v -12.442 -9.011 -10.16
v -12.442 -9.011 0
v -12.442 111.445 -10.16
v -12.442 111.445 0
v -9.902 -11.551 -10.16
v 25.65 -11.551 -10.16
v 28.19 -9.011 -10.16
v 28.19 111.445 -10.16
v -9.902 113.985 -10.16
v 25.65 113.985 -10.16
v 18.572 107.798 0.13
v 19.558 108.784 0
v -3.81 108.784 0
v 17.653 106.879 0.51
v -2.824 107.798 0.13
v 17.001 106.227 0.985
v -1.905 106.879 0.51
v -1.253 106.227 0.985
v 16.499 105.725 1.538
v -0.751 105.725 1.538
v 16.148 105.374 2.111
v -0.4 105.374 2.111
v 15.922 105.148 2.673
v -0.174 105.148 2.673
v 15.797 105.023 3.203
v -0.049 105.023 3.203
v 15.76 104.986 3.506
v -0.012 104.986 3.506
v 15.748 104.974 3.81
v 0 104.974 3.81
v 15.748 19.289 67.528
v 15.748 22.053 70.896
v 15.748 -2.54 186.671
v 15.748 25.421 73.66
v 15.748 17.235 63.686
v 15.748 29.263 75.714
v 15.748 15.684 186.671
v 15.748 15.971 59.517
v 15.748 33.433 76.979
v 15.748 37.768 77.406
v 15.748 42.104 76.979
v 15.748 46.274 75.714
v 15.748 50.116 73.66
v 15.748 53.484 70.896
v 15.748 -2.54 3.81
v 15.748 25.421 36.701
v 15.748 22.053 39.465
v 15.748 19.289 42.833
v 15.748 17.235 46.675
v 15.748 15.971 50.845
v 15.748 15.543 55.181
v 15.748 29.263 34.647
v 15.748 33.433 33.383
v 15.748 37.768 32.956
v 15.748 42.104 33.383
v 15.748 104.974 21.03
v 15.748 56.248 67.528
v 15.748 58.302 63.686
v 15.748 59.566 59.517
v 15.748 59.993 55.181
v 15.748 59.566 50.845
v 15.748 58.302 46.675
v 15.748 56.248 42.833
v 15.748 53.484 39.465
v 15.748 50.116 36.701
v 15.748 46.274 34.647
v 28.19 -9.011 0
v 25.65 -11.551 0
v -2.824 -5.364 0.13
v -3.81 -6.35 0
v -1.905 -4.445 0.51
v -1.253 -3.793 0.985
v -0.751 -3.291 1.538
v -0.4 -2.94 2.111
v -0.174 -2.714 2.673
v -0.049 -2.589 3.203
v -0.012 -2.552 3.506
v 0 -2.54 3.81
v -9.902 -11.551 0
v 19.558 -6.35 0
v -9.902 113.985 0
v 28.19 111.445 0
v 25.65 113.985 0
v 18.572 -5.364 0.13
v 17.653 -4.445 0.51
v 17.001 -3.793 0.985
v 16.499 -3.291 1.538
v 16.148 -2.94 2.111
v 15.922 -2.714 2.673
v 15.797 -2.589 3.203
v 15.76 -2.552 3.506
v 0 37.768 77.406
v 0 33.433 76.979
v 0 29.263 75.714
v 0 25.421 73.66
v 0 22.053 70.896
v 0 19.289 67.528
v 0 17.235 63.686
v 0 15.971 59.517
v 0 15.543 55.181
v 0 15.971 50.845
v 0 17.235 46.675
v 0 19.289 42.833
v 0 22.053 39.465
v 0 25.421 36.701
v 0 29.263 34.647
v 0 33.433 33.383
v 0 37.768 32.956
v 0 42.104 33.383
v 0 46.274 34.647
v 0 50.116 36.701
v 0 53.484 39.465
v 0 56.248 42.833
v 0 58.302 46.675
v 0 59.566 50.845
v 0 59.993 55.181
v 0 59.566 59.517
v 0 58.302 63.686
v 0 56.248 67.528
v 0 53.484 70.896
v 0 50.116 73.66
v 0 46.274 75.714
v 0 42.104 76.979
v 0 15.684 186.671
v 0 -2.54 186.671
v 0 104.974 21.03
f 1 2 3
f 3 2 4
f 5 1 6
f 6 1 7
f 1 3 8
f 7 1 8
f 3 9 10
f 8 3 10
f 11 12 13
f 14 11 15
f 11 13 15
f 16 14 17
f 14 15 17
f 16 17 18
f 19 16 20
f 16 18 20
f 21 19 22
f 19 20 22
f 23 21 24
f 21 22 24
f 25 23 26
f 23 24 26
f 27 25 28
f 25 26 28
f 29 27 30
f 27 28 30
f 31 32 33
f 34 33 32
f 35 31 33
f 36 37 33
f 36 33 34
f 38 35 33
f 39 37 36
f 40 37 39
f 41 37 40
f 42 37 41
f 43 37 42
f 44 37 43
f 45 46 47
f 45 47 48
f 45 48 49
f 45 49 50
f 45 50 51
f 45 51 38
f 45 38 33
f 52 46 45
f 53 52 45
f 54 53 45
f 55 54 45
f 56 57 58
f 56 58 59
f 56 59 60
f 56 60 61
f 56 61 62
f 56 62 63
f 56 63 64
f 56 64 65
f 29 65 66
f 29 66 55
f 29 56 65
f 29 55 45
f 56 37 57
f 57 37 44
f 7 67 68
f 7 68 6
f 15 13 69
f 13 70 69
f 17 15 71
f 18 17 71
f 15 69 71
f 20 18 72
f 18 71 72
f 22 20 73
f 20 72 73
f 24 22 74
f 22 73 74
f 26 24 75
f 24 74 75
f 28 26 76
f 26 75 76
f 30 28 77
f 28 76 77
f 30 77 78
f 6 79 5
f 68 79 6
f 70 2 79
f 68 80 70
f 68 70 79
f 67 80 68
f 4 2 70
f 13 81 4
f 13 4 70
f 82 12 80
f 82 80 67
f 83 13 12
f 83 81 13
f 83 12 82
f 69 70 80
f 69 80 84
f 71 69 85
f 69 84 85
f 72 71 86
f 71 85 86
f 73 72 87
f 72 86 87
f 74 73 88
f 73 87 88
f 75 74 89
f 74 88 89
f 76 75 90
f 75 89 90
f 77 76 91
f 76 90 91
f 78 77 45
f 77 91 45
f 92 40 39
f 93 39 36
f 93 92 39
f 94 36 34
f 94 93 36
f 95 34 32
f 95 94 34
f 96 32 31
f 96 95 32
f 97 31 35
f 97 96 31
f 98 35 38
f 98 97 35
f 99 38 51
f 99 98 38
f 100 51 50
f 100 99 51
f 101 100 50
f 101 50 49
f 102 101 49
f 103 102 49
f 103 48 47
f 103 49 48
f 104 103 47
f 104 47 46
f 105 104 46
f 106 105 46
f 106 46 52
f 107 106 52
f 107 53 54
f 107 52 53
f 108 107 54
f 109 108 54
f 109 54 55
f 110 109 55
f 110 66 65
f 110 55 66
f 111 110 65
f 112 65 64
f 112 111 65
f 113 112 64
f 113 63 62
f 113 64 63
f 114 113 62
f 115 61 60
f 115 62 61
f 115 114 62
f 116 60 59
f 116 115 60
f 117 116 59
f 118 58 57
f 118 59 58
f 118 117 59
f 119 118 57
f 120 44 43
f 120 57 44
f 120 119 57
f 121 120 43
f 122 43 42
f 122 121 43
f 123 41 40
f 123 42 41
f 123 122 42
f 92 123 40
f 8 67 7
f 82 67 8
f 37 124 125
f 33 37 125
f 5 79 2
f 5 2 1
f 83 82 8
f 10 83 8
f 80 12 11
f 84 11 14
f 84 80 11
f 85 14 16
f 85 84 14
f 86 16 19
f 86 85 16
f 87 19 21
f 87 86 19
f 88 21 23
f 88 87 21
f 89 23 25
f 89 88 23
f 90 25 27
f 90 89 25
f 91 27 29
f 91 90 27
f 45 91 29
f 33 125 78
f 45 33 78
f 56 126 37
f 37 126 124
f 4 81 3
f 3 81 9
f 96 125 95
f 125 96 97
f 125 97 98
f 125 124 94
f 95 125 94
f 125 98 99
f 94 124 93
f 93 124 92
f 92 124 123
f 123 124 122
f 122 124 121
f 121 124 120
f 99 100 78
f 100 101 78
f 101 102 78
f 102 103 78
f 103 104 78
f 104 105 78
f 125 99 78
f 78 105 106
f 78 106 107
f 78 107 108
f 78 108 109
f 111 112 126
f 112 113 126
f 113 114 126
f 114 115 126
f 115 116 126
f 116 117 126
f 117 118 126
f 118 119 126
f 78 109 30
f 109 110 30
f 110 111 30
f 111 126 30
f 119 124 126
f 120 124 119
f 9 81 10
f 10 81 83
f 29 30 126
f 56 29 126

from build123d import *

# Parameters (mm, degrees)
EXTRUDE8_DEPTH  = 15.748
SKETCH8_R       = 22.225
EXTRUDE10_DEPTH = 215.740536803
SKETCH9_W       = 40.631586246
SKETCH9_H       = 125.535865236
EXTRUDE11_DEPTH = 10.16
CHAMFER1_SIZE   = 2.54
FILLET2_R       = 3.81


with BuildPart() as part:
    # Sketch7 → Extrude8 (new body)
    with BuildSketch(Plane(origin=(0, 0, 0), x_dir=(0, 0, -1), z_dir=(1, 0, 0))):
        Polygon((-21.030060514, 104.974134166), (-186.670645251, 15.683506456), (-186.670645251, -2.54), (2.54, -2.54), (2.54, 104.974134166), align=None)
    extrude(amount=EXTRUDE8_DEPTH)

    # Sketch8 → Extrude10 (cut, through all)
    with BuildSketch(Plane(origin=(0, 0, 0), x_dir=(0, 0, -1), z_dir=(1, 0, 0))):
        with Locations(Location((-55.180628977, 37.768492455, 0), (0, 0, 180))):
            Circle(SKETCH8_R)
    extrude(amount=EXTRUDE10_DEPTH, mode=Mode.SUBTRACT)

    # Sketch9 → Extrude11 (add)
    with BuildSketch(Plane.XY):
        with Locations((7.874, 51.217067083)):
            Rectangle(SKETCH9_W, SKETCH9_H)
    extrude(amount=-EXTRUDE11_DEPTH)

    # Chamfer1
    chamfer1_edges = [part.edges().sort_by_distance(p)[0] for p in [
        (28.189793123, 113.984999701, -5.08),
        (28.189793123, -11.550865535, -5.08),
        (-12.441793123, -11.550865535, -5.08),
        (-12.441793123, 113.984999701, -5.08),
    ]]
    chamfer(chamfer1_edges, length=CHAMFER1_SIZE)

    # Fillet2
    fillet2_edges = [part.edges().sort_by_distance(p)[0] for p in [
        (7.874, -2.54, 0),
        (15.748, 51.217067083, 0),
        (7.874, 104.974134166, 0),
        (0, 51.217067083, 0),
    ]]
    fillet(fillet2_edges, radius=FILLET2_R)


solid = part.part
